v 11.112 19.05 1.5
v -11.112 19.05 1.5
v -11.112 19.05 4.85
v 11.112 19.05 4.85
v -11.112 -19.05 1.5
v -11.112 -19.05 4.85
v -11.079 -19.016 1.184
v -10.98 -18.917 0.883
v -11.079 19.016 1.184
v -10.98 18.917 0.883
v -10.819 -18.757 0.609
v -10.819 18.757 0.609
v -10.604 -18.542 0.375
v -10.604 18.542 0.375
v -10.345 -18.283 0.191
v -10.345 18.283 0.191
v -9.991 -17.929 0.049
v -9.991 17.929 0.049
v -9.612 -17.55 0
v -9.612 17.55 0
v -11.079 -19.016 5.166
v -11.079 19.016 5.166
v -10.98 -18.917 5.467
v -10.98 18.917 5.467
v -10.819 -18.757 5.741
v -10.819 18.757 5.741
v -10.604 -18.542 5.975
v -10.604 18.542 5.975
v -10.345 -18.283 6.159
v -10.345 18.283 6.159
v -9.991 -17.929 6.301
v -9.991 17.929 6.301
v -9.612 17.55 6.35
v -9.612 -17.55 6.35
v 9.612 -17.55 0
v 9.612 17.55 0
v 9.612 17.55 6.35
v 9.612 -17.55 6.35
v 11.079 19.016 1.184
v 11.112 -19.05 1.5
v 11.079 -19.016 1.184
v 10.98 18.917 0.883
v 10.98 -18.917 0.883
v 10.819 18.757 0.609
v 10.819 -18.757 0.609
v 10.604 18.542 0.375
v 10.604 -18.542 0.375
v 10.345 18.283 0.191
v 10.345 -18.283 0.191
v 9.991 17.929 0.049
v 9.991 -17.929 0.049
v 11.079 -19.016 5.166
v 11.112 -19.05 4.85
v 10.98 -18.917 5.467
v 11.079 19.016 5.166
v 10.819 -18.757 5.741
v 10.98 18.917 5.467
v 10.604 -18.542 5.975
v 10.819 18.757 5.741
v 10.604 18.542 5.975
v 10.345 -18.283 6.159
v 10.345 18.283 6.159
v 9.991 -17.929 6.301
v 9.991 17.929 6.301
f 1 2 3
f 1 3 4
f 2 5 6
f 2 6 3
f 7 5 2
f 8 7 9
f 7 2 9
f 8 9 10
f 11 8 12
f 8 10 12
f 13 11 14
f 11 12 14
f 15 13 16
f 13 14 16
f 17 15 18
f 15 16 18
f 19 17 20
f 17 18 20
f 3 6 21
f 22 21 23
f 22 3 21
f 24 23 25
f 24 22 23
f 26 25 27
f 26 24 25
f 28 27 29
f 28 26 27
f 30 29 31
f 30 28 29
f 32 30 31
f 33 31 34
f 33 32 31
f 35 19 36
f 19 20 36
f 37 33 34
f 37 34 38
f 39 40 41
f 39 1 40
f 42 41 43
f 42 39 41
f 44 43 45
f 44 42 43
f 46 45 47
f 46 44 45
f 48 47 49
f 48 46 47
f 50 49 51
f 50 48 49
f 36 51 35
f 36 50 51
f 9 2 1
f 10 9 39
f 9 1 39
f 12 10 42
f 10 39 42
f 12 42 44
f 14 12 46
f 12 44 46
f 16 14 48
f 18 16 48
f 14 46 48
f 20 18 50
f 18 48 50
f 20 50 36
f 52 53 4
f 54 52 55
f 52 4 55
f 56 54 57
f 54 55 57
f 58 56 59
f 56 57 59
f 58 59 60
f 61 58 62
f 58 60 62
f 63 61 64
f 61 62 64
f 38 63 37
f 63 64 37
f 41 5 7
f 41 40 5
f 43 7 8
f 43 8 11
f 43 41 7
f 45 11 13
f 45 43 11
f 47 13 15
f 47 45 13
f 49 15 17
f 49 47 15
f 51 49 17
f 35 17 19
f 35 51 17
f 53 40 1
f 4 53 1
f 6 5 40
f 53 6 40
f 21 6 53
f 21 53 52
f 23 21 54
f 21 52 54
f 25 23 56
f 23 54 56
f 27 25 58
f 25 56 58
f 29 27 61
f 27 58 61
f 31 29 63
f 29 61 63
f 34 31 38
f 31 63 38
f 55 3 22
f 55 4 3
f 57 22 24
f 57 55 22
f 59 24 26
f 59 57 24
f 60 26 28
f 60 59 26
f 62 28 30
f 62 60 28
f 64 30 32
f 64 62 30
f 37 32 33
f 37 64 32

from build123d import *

# Parameters (mm, degrees)
SKETCH1_W           = 22.225
SKETCH1_H           = 38.1
BOSS_EXTRUDE1_DEPTH = 6.35
FILLET1_R           = 1.5


with BuildPart() as part:
    # Sketch1 → Boss-Extrude1 (new body)
    with BuildSketch(Plane.XY):
        Rectangle(SKETCH1_W, SKETCH1_H)
    extrude(amount=BOSS_EXTRUDE1_DEPTH)

    # Fillet1
    fillet1_edges = [part.edges().sort_by_distance(p)[0] for p in [
        (-11.1125, 0, 6.35),
        (0, -19.05, 6.35),
        (11.1125, 0, 6.35),
        (0, -19.05, 0),
        (-11.1125, 0, 0),
        (0, 19.05, 0),
        (11.1125, 0, 0),
        (0, 19.05, 6.35),
    ]]
    fillet(fillet1_edges, radius=FILLET1_R)


solid = part.part
